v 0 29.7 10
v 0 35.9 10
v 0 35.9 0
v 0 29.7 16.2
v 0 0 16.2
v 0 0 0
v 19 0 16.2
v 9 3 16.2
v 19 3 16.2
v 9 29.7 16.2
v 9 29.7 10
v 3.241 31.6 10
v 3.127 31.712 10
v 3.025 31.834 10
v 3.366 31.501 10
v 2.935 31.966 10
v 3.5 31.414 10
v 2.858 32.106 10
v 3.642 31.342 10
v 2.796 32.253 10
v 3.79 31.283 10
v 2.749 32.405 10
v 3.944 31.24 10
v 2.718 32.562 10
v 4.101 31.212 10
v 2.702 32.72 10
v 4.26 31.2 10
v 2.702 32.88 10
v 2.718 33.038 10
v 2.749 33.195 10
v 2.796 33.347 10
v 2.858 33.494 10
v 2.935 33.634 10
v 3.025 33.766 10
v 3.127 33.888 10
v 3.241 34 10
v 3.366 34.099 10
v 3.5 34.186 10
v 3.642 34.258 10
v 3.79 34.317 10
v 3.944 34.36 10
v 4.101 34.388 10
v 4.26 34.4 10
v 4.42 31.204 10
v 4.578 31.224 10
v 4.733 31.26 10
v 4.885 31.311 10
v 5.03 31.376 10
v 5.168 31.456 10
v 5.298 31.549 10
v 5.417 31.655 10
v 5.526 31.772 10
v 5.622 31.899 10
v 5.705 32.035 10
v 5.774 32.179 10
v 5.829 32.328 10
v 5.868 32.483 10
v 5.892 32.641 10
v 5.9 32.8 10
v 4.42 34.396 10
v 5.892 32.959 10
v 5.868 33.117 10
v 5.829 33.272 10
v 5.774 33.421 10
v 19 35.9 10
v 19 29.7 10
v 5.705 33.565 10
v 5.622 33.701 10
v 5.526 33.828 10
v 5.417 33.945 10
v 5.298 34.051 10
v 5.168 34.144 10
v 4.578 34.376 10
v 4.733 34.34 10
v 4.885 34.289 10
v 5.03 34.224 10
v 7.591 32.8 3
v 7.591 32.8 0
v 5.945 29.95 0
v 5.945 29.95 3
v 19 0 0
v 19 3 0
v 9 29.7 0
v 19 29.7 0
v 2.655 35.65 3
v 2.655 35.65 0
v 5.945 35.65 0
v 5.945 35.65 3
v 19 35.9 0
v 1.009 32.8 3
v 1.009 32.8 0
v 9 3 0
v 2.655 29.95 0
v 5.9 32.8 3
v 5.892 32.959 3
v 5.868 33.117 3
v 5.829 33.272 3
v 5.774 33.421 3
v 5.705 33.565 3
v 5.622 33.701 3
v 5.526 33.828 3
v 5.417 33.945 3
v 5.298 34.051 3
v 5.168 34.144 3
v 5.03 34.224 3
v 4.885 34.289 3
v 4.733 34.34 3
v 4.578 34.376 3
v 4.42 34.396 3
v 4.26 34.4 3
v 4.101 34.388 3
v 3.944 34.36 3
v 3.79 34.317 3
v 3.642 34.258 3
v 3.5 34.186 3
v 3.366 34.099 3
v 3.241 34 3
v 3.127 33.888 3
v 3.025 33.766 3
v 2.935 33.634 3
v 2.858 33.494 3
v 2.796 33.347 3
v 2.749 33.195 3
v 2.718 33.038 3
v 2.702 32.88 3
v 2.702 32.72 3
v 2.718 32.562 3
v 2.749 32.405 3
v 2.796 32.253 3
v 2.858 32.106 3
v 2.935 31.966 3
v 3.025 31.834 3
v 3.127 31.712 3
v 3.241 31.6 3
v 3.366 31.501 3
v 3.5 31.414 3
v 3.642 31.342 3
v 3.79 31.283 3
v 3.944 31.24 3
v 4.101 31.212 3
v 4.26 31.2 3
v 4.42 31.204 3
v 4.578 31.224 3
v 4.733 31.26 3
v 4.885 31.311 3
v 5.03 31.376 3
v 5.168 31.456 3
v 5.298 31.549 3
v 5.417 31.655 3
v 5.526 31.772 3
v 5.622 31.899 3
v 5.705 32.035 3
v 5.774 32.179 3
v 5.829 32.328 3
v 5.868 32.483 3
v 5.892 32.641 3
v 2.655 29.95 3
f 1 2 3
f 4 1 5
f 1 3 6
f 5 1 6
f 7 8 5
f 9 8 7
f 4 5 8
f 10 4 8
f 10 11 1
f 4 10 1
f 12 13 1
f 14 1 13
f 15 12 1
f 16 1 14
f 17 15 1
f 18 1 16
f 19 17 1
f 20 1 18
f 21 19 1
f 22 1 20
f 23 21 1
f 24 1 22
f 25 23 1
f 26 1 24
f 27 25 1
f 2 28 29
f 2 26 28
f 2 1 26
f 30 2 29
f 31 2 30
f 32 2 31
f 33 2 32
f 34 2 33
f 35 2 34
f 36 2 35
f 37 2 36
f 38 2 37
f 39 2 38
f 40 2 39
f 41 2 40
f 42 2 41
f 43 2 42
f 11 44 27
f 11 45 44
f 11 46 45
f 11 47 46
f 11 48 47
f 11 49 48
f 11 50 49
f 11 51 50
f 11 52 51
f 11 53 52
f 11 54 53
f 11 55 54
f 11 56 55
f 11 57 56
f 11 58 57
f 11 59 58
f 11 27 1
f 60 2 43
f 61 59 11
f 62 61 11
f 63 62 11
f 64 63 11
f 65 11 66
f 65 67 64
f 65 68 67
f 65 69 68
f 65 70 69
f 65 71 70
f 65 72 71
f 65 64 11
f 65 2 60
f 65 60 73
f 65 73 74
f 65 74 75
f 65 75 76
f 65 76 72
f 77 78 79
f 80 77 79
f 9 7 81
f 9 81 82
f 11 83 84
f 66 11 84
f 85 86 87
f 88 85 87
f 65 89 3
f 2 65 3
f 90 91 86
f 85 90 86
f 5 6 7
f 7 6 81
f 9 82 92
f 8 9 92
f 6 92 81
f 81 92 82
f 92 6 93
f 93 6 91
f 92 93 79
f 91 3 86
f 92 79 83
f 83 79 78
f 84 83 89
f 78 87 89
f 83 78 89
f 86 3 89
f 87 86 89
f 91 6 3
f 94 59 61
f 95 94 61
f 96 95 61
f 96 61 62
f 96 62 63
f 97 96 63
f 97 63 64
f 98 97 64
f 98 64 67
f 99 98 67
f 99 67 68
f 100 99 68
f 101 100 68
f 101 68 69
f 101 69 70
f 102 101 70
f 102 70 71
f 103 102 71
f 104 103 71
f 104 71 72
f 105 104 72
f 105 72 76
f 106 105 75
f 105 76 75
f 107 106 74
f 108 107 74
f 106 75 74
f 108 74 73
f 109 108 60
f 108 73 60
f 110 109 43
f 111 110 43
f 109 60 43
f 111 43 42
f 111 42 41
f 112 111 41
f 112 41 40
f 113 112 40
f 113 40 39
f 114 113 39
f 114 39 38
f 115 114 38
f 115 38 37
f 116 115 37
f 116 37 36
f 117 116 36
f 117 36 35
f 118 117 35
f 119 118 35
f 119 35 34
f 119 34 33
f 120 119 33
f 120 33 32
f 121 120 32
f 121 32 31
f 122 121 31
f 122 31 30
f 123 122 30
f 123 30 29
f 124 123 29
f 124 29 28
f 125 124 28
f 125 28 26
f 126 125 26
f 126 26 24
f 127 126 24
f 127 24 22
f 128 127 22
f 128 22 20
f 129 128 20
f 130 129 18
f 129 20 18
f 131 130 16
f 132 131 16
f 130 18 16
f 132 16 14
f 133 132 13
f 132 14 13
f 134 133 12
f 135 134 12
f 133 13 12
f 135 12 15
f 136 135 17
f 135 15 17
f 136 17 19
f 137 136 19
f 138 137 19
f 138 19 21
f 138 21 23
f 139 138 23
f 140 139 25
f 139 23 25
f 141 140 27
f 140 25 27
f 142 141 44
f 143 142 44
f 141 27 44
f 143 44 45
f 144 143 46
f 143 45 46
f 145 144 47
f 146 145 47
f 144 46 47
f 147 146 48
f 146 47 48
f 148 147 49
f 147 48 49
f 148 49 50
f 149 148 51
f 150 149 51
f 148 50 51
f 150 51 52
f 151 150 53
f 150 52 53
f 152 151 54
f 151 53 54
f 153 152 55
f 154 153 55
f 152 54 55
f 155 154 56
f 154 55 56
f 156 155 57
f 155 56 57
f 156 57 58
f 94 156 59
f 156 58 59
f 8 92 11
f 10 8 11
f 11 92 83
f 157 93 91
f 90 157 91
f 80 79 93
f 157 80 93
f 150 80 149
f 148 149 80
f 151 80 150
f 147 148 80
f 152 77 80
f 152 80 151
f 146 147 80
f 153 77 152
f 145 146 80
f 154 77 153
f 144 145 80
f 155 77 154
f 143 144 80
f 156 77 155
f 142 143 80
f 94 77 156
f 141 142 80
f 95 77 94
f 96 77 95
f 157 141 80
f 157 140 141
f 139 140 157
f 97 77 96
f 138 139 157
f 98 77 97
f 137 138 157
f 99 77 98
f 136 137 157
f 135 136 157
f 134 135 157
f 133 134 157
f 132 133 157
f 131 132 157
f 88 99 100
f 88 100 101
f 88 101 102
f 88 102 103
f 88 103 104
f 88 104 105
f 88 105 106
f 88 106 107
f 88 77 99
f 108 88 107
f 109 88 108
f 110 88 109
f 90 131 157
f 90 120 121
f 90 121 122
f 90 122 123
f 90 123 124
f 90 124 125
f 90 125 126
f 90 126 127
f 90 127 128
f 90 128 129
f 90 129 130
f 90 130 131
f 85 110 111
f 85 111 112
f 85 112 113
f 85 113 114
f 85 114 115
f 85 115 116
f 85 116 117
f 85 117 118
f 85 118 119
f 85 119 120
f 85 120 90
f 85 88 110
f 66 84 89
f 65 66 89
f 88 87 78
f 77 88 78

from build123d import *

# Parameters (mm, degrees)
SALIENTE_EXTRUIR1_DEPTH = 10
SALIENTE_EXTRUIR2_DEPTH = 6.2
CORTAR_EXTRUIR1_REACH   = 12
CROQUIS3_R              = 1.6
CORTAR_EXTRUIR2_DEPTH   = 3


with BuildPart() as part:
    # Croquis1 → Saliente-Extruir1 (new body)
    with BuildSketch(Plane.XY):
        Polygon((0, 0), (19, 0), (19, 3), (9, 3), (9, 29.7), (19, 29.7), (19, 35.9), (0, 35.9), align=None)
    extrude(amount=SALIENTE_EXTRUIR1_DEPTH)

    # Croquis2 → Saliente-Extruir2 (add)
    with BuildSketch(Plane.XY.offset(10)):
        Polygon((9, 29.7), (0, 29.7), (0, 0), (19, 0), (19, 3), (9, 3), align=None)
    extrude(amount=SALIENTE_EXTRUIR2_DEPTH)

    # Croquis3 → Cortar-Extruir1 (cut, up to next)
    with BuildSketch(Plane.XY.offset(10), mode=Mode.PRIVATE) as cortar_extruir1_sk1:
        with Locations((4.3, 32.8)):
            Circle(CROQUIS3_R)
    cortar_extruir1_tool1 = extrude(cortar_extruir1_sk1.sketch, amount=-CORTAR_EXTRUIR1_REACH, mode=Mode.PRIVATE) & part.part
    add(cortar_extruir1_tool1.solids().sort_by_distance((4.3, 32.8, 10))[0], mode=Mode.SUBTRACT)

    # Croquis4 → Cortar-Extruir2 (cut)
    with BuildSketch(Plane(origin=(0, 0, 0), x_dir=(-1, 0, 0), z_dir=(0, 0, -1))):
        Polygon((-2.654551733, 35.65), (-5.945448267, 35.65), (-7.590896534, 32.8), (-5.945448267, 29.95), (-2.654551733, 29.95), (-1.009103466, 32.8), align=None)
    extrude(amount=-CORTAR_EXTRUIR2_DEPTH, mode=Mode.SUBTRACT)


solid = part.part
